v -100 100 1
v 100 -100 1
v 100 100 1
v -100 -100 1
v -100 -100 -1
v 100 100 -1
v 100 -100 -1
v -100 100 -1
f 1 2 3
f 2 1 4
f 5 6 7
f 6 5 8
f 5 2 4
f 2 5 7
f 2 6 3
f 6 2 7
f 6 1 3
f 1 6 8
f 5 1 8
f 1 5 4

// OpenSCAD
// Parameters
sheet_length = 200; //[100:400:1]
sheet_width = 200; //[100:400:1]
sheet_thickness = 2; //[1:6:0.5]

// Geometry
module sheet_body() {
  color([0.85, 0.85, 0.8]) // Off-white for 3D printed PLA
  translate([0, 0, 0])
  cube([sheet_length, sheet_width, sheet_thickness], center=true);
}

// Final Output
union() {
  sheet_body();
}
